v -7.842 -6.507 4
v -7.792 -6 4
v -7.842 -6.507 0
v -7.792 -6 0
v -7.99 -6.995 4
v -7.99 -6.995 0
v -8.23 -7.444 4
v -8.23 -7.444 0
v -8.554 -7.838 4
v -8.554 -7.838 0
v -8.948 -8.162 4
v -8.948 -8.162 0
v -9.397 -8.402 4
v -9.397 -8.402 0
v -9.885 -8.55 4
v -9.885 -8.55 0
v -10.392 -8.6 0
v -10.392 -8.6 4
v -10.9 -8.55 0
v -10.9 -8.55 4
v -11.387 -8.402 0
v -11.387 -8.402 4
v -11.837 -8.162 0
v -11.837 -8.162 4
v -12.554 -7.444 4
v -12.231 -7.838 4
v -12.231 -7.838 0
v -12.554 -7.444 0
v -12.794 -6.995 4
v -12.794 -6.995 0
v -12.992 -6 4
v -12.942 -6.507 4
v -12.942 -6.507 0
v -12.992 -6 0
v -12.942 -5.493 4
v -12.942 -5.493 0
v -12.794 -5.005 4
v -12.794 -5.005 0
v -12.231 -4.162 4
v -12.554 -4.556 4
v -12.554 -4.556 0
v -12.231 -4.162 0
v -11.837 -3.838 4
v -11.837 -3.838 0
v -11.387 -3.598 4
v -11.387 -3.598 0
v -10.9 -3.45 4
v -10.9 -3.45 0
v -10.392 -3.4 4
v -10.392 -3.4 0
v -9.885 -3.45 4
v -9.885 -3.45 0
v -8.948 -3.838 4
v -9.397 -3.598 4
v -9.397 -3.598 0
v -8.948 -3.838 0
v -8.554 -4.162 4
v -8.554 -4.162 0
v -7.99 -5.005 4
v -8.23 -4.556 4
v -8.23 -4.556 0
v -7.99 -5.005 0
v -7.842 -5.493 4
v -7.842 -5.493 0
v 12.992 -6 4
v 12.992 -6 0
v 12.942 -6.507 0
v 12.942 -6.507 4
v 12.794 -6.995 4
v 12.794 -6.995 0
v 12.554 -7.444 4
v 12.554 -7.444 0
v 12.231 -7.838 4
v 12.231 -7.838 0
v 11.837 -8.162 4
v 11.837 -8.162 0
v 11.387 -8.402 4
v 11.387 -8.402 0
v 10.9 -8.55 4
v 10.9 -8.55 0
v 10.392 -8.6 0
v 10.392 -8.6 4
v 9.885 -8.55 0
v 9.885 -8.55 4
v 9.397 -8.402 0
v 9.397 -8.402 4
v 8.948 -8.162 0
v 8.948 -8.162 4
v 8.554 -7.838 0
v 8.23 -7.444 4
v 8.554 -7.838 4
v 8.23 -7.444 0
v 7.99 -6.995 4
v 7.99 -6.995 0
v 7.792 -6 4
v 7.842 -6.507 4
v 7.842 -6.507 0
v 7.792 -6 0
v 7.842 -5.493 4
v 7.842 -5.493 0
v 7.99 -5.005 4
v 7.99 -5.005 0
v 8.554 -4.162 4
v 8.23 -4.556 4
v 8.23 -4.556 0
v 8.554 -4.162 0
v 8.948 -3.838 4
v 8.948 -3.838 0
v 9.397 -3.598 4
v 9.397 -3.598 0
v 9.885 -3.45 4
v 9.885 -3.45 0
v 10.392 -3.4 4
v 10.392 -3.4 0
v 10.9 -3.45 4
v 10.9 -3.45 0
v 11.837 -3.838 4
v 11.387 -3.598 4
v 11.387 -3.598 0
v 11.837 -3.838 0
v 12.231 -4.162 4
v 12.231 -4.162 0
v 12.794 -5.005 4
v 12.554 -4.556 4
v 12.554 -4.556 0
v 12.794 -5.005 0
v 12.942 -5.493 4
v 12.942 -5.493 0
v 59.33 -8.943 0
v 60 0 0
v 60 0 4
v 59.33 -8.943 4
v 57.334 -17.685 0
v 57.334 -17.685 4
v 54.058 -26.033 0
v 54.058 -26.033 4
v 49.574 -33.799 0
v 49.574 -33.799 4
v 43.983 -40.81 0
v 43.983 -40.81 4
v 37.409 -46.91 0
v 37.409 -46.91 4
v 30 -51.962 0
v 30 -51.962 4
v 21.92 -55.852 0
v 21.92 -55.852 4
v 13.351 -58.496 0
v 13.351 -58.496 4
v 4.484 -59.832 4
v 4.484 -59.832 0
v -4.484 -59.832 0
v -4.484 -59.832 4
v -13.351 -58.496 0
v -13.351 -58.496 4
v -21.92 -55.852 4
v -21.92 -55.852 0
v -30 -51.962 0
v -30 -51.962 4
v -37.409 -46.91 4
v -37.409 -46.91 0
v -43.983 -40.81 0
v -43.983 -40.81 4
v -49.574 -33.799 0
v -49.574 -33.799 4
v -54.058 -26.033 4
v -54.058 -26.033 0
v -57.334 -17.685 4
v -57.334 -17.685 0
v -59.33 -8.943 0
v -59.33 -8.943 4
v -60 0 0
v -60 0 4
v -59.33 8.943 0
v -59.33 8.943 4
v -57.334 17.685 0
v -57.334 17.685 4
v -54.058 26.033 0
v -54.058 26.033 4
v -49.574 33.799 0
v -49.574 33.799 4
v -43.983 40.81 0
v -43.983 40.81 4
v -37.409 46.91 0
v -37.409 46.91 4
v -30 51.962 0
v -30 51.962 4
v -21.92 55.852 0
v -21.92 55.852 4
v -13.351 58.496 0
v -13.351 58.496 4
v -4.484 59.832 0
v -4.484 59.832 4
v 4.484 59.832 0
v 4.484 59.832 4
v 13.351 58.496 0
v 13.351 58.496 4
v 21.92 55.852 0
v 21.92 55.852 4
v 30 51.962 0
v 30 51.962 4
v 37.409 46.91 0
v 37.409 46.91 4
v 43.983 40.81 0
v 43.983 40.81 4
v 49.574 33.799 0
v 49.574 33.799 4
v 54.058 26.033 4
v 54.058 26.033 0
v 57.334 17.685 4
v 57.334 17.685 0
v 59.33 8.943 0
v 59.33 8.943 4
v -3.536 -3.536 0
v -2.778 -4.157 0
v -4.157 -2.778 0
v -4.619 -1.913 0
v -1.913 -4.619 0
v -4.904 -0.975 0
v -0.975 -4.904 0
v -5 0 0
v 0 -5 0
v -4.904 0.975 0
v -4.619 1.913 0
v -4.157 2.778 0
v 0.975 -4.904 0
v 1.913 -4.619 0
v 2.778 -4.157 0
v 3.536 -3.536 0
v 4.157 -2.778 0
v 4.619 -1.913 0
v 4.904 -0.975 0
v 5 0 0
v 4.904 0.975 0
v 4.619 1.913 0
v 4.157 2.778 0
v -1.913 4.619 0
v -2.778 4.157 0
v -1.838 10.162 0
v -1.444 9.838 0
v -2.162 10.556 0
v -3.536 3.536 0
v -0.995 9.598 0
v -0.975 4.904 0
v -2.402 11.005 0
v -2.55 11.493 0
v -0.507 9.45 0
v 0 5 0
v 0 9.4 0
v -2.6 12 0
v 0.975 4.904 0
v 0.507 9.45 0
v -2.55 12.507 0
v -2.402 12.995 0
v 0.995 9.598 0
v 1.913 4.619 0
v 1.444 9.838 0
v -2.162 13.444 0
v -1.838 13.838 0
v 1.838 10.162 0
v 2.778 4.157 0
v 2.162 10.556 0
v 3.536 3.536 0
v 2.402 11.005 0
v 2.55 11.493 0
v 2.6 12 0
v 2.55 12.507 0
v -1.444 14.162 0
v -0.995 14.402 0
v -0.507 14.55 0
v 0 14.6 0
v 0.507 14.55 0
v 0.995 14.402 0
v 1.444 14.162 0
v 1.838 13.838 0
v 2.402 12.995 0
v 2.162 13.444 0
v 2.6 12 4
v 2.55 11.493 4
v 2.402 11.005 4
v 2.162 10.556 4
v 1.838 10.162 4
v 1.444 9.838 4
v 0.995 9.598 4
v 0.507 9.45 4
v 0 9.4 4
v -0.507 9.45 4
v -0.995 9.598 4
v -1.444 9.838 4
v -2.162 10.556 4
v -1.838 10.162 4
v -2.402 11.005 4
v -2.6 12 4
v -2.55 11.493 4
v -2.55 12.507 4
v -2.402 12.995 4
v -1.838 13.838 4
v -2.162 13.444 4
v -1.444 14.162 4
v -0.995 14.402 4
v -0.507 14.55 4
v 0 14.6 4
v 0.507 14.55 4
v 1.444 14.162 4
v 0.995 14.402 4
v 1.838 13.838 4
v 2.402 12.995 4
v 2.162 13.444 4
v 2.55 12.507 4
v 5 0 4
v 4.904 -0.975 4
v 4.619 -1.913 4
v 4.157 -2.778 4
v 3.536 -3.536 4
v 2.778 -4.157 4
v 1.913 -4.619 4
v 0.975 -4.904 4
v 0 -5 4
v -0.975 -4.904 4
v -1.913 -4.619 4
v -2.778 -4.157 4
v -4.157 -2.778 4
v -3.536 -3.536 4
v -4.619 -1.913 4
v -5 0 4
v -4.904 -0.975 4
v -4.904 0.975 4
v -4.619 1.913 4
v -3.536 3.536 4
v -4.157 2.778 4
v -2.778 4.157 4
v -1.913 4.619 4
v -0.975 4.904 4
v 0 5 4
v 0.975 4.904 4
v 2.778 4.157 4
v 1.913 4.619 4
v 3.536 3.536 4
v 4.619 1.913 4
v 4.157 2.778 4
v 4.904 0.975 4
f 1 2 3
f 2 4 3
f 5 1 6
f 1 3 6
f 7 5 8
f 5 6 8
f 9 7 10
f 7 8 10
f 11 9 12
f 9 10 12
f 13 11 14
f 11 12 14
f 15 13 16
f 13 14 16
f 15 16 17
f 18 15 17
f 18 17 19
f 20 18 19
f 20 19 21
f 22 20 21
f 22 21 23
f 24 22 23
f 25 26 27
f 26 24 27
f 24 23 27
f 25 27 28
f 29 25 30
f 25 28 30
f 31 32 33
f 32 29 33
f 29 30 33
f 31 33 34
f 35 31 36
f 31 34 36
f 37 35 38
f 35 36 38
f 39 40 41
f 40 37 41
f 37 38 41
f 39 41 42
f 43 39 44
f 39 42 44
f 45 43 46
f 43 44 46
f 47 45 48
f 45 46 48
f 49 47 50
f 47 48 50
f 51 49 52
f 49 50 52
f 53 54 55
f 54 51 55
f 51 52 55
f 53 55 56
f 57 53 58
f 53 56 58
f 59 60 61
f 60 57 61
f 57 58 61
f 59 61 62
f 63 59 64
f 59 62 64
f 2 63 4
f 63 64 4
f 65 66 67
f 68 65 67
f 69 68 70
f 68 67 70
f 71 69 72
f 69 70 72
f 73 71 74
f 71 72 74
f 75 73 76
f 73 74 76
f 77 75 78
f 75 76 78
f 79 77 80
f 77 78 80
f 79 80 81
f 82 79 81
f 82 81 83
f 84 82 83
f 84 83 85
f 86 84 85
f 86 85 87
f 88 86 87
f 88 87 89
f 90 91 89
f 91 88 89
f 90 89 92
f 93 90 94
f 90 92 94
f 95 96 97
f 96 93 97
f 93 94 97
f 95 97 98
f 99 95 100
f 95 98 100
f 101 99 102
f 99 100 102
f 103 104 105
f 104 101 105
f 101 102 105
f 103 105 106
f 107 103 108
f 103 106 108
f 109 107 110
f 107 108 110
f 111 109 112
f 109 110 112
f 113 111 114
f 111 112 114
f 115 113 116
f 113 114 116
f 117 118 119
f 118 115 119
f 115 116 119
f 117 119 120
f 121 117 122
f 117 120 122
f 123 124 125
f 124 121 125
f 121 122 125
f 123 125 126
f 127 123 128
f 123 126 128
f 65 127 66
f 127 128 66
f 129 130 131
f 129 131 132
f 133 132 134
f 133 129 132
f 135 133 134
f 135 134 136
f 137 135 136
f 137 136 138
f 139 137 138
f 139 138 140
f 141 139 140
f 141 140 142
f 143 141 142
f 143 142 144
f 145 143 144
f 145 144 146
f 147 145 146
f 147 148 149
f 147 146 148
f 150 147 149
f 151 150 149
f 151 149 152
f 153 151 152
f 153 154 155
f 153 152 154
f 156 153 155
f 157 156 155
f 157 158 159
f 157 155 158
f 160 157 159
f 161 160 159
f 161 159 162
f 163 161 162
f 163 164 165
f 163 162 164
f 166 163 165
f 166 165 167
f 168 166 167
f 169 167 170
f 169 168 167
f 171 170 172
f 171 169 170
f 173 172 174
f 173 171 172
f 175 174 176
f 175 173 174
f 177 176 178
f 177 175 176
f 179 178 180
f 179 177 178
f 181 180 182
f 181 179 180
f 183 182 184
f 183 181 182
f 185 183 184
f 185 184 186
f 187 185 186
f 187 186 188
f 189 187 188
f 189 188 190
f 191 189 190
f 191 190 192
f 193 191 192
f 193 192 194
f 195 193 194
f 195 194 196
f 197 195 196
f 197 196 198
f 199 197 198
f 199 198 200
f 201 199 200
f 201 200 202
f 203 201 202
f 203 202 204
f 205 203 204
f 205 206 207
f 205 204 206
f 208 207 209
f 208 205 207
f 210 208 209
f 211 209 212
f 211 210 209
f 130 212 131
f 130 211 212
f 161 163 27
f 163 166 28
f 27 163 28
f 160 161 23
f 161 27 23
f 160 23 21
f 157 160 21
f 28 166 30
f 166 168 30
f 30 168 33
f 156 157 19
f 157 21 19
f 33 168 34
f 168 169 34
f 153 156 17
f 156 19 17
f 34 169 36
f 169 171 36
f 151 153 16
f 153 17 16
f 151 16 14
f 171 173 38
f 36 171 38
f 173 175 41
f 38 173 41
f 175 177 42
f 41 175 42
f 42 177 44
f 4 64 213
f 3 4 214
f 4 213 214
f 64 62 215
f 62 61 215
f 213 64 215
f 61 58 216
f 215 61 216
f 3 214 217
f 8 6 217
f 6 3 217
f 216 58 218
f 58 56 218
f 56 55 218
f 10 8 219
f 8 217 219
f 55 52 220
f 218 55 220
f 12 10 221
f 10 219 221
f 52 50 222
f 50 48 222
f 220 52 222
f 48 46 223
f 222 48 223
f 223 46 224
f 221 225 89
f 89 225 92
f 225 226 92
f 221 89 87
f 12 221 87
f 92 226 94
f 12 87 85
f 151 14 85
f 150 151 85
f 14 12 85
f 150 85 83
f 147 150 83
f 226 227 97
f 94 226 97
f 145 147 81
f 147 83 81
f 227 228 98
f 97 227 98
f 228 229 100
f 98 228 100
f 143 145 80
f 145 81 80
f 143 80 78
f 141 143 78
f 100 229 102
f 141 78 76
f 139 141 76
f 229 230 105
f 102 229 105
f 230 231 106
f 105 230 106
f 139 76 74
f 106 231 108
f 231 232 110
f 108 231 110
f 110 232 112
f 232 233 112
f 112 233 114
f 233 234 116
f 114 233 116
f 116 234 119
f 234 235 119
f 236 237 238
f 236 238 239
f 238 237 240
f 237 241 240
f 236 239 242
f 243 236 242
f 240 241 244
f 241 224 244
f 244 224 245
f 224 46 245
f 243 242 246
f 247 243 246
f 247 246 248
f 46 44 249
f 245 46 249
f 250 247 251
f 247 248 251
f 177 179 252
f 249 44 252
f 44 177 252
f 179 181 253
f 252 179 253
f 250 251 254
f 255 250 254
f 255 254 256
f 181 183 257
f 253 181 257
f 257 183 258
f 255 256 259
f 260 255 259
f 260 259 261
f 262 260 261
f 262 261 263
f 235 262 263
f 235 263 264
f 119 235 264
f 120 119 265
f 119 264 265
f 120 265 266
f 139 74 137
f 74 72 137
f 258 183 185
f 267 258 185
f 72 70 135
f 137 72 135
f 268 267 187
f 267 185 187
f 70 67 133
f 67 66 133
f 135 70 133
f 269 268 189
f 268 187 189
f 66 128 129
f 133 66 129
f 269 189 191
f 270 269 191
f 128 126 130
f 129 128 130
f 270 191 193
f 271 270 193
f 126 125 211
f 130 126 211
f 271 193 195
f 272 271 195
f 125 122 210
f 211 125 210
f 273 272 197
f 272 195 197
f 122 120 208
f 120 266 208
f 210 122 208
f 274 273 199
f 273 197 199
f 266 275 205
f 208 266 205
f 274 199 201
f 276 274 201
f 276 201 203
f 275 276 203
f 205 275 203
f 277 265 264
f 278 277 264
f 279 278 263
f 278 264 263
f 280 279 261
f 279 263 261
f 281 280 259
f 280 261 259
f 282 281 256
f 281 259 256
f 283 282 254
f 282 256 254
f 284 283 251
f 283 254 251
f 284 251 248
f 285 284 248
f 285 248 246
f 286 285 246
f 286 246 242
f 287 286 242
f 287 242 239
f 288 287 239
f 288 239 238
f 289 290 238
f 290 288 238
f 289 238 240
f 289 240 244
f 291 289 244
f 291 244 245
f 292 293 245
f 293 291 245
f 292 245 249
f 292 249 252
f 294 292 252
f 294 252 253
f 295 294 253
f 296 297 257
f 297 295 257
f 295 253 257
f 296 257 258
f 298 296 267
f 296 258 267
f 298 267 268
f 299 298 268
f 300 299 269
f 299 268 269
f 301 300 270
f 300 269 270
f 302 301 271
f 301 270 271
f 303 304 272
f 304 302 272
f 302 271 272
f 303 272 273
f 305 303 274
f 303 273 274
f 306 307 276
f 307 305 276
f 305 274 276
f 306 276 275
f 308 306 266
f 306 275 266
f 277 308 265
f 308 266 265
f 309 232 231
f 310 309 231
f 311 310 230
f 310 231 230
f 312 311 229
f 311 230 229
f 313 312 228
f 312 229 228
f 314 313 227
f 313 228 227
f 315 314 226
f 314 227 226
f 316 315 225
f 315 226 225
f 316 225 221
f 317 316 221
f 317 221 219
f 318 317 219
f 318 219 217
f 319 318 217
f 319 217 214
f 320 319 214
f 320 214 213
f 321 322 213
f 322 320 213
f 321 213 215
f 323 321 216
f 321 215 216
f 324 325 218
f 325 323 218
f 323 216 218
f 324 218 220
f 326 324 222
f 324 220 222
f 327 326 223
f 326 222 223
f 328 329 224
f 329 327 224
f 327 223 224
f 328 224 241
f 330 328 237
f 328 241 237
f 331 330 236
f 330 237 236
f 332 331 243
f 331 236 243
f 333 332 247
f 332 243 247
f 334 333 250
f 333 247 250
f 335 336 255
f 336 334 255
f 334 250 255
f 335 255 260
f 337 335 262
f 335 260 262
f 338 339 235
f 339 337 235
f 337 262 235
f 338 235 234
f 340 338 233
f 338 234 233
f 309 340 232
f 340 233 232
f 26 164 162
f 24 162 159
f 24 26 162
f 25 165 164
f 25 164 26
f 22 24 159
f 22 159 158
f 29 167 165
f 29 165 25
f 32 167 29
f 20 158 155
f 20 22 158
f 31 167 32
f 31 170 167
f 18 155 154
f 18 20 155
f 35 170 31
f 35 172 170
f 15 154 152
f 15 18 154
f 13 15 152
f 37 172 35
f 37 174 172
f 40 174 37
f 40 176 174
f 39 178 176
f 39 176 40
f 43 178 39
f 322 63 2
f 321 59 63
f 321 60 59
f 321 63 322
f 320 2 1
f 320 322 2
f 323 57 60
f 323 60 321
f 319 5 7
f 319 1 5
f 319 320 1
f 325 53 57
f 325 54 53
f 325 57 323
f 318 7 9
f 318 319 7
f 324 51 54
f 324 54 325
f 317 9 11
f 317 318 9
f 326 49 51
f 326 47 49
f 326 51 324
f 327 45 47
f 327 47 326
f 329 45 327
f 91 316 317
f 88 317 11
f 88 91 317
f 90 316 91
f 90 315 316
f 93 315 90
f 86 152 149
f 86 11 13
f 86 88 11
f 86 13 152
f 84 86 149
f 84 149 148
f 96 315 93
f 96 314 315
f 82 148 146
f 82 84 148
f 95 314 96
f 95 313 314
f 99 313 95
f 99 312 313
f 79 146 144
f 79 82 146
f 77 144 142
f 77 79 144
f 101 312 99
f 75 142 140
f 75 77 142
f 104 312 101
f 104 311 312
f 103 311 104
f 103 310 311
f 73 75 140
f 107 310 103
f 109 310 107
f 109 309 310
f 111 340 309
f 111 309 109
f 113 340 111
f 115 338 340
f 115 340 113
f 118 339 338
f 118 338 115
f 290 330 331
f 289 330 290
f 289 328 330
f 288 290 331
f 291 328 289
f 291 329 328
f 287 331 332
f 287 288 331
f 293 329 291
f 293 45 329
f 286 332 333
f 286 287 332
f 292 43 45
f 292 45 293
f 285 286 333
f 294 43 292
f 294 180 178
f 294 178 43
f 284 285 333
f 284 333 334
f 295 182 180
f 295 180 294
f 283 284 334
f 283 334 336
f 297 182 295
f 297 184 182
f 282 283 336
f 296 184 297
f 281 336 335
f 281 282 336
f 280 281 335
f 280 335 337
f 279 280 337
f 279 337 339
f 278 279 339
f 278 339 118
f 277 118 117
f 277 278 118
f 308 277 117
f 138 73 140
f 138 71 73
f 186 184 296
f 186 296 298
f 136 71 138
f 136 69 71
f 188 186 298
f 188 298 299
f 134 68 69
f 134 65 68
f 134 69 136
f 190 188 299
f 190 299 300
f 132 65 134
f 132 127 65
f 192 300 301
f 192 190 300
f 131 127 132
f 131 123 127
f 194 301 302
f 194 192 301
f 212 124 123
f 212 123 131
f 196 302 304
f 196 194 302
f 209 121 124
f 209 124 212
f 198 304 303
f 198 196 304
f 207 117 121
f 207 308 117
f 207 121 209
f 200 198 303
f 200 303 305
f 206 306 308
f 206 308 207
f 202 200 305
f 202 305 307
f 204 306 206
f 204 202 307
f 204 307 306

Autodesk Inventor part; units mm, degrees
ref_plane "YZ Plane" through (0, 0, 0) normal (1, 0, 0) x (0, 1, 0)
ref_plane "XZ Plane" through (0, 0, 0) normal (0, 1, 0) x (-1, 0, 0)
ref_plane "XY Plane" through (0, 0, 0) normal (0, 0, 1) x (1, 0, 0)
sketch "Эскиз1" plane through (0, 0, 0) normal (0, 0, 1) x (1, 0, 0)
  circle A0 centre (0, 0) radius 5
  circle A1 centre (0, 0) radius 60
  line L0 (0, -84) -> (0, 84) construction
  circle A2 centre (0, 0) radius 20.7 construction
  circle A3 centre (0, 12) radius 2.6
  line L1 (-84, 0) -> (84, 0) construction
  circle A4 centre (-10.3923, -6) radius 2.6
  circle A5 centre (10.3923, -6) radius 2.6
  dimension "d0" = 10
  dimension "d1" = 120
  dimension "d4" = 41.4
  dimension "d5" = 5.2
  dimension "d6" = 12
  dimension "d9" = 360
extrude "Выдавливание1" add sketch "Эскиз1" along normal blind 4
properties part number "Бортик конусной катушки"
